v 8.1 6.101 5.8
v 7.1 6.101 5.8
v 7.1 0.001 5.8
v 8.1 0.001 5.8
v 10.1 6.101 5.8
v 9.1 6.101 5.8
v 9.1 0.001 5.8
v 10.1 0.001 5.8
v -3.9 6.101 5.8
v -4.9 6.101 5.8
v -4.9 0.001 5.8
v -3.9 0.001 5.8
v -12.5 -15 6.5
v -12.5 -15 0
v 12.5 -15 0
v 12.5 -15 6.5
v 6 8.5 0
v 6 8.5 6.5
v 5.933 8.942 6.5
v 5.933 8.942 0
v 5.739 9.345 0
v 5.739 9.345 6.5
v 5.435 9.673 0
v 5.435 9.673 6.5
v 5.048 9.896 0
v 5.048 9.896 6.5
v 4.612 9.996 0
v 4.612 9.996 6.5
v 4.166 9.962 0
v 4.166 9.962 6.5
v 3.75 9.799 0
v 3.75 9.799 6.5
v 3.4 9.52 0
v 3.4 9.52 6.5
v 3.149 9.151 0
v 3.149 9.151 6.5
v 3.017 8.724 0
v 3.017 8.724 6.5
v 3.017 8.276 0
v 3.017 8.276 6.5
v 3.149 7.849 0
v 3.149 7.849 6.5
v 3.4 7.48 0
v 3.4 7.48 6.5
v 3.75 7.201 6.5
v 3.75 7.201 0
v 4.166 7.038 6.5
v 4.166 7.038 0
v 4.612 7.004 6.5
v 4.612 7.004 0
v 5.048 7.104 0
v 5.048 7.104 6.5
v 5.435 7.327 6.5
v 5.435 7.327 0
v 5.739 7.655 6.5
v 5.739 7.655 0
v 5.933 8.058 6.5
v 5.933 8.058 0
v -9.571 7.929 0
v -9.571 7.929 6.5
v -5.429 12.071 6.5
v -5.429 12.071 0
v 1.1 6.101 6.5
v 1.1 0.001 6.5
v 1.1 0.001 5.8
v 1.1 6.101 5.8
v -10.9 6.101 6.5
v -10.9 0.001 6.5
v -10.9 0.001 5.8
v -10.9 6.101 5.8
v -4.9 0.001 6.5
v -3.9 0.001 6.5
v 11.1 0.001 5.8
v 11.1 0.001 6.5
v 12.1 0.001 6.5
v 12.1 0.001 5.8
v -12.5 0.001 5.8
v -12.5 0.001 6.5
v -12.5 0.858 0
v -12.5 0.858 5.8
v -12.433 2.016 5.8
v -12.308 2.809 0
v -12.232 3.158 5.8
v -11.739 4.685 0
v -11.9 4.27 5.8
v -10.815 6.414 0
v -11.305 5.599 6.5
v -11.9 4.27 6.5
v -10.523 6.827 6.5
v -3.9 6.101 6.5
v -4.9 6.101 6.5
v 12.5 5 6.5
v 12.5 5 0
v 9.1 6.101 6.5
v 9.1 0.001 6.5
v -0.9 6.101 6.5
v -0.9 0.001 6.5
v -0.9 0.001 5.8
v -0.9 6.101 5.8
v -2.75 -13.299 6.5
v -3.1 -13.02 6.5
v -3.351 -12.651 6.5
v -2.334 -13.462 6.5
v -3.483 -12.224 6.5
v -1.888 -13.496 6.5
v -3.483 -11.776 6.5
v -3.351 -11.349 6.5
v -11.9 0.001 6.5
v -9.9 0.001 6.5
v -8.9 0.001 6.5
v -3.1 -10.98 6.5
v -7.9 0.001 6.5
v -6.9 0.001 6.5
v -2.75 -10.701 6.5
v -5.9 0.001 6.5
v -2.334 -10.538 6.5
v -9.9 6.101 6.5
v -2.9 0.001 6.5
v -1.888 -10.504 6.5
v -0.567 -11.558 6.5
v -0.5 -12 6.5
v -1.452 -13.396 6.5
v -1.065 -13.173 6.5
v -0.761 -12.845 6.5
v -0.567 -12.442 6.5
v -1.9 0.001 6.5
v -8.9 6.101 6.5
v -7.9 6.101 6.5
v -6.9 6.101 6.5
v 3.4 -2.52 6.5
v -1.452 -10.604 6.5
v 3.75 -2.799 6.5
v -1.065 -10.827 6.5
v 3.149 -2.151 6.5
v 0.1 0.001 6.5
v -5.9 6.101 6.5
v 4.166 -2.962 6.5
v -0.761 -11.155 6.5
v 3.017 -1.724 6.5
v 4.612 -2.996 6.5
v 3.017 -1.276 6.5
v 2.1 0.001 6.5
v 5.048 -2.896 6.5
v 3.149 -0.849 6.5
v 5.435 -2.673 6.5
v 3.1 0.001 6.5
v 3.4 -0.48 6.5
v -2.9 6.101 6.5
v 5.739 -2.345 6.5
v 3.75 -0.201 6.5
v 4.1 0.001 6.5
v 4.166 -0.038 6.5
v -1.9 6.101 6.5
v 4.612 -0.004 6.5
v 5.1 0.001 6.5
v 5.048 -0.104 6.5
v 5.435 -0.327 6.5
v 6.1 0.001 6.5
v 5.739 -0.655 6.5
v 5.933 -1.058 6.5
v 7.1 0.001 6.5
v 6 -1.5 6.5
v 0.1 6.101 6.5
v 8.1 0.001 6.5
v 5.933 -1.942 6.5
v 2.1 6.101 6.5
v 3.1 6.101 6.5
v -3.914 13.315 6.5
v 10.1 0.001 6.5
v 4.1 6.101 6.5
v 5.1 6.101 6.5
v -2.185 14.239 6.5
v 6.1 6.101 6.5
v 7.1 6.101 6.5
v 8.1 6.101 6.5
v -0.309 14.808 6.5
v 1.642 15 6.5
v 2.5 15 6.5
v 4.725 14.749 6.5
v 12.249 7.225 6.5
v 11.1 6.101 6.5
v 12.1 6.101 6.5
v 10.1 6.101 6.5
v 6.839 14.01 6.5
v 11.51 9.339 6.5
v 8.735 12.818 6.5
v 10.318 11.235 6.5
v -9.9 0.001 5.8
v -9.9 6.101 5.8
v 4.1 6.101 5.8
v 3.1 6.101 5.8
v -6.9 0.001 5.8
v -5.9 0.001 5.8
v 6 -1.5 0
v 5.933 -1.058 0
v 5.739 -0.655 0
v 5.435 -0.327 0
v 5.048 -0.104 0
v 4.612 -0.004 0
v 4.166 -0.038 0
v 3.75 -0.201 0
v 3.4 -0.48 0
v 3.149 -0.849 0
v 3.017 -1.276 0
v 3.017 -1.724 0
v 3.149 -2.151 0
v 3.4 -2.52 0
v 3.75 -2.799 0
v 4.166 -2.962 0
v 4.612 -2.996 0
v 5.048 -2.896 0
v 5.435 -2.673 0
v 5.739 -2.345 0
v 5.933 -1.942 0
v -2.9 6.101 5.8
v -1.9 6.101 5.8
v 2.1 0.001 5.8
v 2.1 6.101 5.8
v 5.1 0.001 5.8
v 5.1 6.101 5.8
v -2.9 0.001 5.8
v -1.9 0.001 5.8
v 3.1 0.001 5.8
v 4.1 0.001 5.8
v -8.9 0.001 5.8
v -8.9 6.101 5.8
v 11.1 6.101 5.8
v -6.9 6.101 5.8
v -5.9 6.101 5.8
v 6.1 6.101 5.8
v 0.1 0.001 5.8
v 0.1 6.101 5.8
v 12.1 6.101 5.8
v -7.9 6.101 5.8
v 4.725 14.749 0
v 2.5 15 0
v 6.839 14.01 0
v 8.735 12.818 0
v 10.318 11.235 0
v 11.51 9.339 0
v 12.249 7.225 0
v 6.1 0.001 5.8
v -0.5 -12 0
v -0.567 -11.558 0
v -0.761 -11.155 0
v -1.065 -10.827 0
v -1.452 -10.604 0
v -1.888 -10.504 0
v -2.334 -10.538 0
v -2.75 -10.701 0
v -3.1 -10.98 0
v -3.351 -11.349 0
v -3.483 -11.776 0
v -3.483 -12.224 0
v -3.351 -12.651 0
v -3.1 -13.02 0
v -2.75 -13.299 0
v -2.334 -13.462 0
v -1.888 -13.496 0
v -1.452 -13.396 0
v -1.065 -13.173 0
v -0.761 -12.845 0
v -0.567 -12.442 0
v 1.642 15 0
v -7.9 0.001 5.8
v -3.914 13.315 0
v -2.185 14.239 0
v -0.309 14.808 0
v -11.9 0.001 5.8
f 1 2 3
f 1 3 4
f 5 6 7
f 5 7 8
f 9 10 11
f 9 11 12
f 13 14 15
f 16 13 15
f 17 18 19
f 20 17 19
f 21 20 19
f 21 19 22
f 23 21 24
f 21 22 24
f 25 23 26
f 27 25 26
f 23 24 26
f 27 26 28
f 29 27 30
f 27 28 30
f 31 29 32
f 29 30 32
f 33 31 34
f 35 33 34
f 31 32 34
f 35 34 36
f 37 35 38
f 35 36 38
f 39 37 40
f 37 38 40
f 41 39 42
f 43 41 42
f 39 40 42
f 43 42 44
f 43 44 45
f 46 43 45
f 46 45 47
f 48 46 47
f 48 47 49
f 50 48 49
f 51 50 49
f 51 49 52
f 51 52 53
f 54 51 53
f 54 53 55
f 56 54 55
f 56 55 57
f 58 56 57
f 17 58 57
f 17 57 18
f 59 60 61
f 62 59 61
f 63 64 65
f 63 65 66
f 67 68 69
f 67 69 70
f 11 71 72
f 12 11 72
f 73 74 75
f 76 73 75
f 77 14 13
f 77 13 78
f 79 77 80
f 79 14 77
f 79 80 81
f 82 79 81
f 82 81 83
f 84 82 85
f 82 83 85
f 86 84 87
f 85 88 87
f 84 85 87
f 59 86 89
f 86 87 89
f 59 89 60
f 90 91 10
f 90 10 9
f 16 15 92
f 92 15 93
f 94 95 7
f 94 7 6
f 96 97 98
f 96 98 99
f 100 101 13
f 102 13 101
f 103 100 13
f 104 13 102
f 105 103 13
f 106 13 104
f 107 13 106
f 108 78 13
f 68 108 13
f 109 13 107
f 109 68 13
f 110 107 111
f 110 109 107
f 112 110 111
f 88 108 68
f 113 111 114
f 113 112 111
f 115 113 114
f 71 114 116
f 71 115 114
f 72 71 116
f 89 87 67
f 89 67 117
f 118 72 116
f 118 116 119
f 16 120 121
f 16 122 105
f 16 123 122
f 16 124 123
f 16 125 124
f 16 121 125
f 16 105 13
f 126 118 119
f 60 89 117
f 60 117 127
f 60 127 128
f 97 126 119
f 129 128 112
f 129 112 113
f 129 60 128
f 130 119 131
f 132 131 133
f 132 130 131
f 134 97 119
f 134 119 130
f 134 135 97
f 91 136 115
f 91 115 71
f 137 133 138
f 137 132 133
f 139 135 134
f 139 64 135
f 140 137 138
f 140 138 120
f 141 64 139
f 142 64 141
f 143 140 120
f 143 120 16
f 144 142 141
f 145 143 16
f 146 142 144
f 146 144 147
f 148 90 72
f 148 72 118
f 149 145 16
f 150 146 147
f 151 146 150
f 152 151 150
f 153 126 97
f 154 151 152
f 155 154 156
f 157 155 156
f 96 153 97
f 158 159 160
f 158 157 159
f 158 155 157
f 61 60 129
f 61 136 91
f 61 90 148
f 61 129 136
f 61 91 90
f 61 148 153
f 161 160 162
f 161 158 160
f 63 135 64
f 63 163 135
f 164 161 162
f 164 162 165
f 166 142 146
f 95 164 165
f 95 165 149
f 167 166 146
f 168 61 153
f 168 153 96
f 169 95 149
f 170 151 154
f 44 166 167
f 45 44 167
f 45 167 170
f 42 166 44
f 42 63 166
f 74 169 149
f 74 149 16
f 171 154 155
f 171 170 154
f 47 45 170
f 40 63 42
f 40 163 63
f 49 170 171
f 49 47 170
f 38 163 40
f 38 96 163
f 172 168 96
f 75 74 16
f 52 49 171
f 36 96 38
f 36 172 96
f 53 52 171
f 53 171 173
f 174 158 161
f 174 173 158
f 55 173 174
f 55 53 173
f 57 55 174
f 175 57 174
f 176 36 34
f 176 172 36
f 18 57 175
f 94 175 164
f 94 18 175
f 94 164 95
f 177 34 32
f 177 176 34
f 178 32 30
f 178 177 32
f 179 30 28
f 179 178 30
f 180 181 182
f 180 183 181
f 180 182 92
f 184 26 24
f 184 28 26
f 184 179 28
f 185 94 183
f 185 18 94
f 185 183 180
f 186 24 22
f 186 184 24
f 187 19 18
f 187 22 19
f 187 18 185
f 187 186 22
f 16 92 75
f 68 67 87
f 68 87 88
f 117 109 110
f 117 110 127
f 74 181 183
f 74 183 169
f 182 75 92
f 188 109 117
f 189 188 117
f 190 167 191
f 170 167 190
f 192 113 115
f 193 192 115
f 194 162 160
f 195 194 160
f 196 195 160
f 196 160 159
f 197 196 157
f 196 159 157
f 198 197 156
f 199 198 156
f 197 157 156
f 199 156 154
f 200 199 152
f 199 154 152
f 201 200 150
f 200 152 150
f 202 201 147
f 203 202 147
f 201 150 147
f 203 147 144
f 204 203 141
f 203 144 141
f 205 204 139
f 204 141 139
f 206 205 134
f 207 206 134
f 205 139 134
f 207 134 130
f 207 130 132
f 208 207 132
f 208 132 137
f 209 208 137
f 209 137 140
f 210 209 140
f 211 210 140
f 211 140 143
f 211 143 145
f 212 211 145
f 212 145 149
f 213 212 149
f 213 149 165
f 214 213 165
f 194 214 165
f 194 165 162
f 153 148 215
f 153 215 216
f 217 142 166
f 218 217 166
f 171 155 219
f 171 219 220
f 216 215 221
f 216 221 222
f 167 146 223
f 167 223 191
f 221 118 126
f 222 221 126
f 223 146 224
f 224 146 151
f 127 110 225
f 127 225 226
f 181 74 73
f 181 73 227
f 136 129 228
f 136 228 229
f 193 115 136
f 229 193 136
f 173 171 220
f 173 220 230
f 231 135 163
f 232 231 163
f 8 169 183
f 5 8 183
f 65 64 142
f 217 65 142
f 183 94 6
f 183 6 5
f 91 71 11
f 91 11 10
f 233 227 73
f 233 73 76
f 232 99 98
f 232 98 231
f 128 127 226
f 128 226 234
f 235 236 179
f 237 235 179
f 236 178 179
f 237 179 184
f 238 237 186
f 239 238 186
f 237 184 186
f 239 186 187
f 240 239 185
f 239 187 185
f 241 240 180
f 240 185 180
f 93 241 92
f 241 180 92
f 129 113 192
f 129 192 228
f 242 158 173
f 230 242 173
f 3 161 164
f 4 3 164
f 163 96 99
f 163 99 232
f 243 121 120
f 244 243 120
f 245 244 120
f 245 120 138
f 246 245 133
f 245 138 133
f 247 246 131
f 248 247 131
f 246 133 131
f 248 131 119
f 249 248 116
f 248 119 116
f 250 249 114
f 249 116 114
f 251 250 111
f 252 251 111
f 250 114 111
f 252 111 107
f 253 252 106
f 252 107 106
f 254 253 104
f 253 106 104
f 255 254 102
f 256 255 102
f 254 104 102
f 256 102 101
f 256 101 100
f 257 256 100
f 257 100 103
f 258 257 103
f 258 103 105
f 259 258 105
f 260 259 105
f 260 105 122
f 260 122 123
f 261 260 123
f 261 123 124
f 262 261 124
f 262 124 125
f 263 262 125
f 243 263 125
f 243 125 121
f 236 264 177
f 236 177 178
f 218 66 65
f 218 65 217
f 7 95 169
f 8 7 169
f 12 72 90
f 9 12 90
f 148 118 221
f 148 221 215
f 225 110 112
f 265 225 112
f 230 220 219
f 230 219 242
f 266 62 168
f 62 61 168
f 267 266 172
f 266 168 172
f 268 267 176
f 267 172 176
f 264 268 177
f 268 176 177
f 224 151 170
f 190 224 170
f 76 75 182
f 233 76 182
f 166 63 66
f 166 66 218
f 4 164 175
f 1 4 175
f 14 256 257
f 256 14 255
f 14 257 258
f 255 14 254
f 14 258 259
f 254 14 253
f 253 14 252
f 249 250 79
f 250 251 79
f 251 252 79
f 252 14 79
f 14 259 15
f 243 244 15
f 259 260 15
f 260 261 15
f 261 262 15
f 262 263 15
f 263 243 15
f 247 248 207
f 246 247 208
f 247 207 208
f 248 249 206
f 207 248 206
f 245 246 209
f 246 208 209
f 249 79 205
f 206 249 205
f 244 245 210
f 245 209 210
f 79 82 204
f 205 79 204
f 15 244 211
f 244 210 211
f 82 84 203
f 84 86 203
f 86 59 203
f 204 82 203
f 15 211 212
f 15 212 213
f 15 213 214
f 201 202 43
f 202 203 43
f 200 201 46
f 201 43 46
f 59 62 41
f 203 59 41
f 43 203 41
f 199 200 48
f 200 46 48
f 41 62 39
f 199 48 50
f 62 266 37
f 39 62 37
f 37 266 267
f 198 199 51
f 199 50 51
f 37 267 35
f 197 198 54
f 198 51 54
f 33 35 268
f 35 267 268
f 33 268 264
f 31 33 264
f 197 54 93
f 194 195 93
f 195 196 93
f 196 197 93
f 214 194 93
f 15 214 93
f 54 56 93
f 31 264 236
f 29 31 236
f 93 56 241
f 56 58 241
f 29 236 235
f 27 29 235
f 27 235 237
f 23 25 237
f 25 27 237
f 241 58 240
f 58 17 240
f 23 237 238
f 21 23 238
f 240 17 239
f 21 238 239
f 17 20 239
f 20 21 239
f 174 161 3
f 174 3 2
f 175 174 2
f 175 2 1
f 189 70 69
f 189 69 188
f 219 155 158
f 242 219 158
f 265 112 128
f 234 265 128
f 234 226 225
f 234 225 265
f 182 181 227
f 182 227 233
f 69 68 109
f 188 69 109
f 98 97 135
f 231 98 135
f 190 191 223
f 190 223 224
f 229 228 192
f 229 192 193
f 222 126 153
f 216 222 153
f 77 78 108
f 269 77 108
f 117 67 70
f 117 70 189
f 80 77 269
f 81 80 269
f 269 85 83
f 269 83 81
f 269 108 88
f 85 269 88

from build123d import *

# Parameters (mm, degrees)
F0_W        = 25
F0_H        = 30
F1_DEPTH    = 6.5
F2_R        = 1.5
F3_DEPTH    = 6.501
F4_W        = 1
F4_H        = 6.1
F4_W_2      = 0.4
F4_W_3      = 0.6
F5_DEPTH    = 0.7
F6_T1_DEPTH = 57.9336597593
F7_R        = 10


# Not quite as in the source:
# - a fillet or chamfer that OpenCascade refuses, or shapes differently, is made with other operations: its cross-section is extruded or revolved along the edge and cut away or added


with BuildPart() as f1:
    # F0 (on Top) → F1 (new body)
    with BuildSketch(Plane.XY):
        Rectangle(F0_W, F0_H)
    extrude(amount=F1_DEPTH)

    # F2 (on face) → F3 (cut, through all)
    with BuildSketch(Plane.XY.offset(6.5)):
        with Locations((-2, -12)):
            Circle(F2_R)
        with Locations((4.5, -1.5)):
            Circle(F2_R)
        with Locations((4.5, 8.5)):
            Circle(F2_R)
    extrude(amount=-F3_DEPTH, mode=Mode.SUBTRACT)

    # F4 (on face) → F5 (cut)
    with BuildSketch(Plane.XY.offset(6.5)):
        with Locations((11.6, 3.051)):
            Rectangle(F4_W, F4_H)
        with Locations((9.6, 3.051)):
            Rectangle(F4_W, F4_H)
        with Locations((7.6, 3.051)):
            Rectangle(F4_W, F4_H)
        with Locations((5.6, 3.051)):
            Rectangle(F4_W, F4_H)
        with Locations((3.6, 3.051)):
            Rectangle(F4_W, F4_H)
        with Locations((1.6, 3.051)):
            Rectangle(F4_W, F4_H)
        with Locations((-0.4, 3.051)):
            Rectangle(F4_W, F4_H)
        with Locations((-2.4, 3.051)):
            Rectangle(F4_W, F4_H)
        with Locations((-4.4, 3.051)):
            Rectangle(F4_W, F4_H)
        with Locations((-6.4, 3.051)):
            Rectangle(F4_W, F4_H)
        with Locations((-8.4, 3.051)):
            Rectangle(F4_W, F4_H)
        with Locations((-10.4, 3.051)):
            Rectangle(F4_W, F4_H)
        with Locations((-12.7, 3.051)):
            Rectangle(F4_W_2, F4_H)
        with Locations((-12.2, 3.051)):
            Rectangle(F4_W_3, F4_H)
    extrude(amount=-F5_DEPTH, mode=Mode.SUBTRACT)

    # F6: chamfer of 10 on 1 edges, made by hand

    # F6_s2 → F6_t1 (cut)
    with BuildSketch(Plane.XY.offset(-25.7168298797)):
        Polygon((-12.5, 5), (-2.5, 15), (-12.5, 15), align=None)
    extrude(amount=F6_T1_DEPTH, mode=Mode.SUBTRACT)

    # F7
    f7_edges = [f1.edges().sort_by_distance(p)[0] for p in [
        (-2.5, 15, 3.25),
        (-12.5, 5, 2.9),
        (12.5, 15, 3.25),
    ]]
    fillet(f7_edges, radius=F7_R)


solid = f1.part
